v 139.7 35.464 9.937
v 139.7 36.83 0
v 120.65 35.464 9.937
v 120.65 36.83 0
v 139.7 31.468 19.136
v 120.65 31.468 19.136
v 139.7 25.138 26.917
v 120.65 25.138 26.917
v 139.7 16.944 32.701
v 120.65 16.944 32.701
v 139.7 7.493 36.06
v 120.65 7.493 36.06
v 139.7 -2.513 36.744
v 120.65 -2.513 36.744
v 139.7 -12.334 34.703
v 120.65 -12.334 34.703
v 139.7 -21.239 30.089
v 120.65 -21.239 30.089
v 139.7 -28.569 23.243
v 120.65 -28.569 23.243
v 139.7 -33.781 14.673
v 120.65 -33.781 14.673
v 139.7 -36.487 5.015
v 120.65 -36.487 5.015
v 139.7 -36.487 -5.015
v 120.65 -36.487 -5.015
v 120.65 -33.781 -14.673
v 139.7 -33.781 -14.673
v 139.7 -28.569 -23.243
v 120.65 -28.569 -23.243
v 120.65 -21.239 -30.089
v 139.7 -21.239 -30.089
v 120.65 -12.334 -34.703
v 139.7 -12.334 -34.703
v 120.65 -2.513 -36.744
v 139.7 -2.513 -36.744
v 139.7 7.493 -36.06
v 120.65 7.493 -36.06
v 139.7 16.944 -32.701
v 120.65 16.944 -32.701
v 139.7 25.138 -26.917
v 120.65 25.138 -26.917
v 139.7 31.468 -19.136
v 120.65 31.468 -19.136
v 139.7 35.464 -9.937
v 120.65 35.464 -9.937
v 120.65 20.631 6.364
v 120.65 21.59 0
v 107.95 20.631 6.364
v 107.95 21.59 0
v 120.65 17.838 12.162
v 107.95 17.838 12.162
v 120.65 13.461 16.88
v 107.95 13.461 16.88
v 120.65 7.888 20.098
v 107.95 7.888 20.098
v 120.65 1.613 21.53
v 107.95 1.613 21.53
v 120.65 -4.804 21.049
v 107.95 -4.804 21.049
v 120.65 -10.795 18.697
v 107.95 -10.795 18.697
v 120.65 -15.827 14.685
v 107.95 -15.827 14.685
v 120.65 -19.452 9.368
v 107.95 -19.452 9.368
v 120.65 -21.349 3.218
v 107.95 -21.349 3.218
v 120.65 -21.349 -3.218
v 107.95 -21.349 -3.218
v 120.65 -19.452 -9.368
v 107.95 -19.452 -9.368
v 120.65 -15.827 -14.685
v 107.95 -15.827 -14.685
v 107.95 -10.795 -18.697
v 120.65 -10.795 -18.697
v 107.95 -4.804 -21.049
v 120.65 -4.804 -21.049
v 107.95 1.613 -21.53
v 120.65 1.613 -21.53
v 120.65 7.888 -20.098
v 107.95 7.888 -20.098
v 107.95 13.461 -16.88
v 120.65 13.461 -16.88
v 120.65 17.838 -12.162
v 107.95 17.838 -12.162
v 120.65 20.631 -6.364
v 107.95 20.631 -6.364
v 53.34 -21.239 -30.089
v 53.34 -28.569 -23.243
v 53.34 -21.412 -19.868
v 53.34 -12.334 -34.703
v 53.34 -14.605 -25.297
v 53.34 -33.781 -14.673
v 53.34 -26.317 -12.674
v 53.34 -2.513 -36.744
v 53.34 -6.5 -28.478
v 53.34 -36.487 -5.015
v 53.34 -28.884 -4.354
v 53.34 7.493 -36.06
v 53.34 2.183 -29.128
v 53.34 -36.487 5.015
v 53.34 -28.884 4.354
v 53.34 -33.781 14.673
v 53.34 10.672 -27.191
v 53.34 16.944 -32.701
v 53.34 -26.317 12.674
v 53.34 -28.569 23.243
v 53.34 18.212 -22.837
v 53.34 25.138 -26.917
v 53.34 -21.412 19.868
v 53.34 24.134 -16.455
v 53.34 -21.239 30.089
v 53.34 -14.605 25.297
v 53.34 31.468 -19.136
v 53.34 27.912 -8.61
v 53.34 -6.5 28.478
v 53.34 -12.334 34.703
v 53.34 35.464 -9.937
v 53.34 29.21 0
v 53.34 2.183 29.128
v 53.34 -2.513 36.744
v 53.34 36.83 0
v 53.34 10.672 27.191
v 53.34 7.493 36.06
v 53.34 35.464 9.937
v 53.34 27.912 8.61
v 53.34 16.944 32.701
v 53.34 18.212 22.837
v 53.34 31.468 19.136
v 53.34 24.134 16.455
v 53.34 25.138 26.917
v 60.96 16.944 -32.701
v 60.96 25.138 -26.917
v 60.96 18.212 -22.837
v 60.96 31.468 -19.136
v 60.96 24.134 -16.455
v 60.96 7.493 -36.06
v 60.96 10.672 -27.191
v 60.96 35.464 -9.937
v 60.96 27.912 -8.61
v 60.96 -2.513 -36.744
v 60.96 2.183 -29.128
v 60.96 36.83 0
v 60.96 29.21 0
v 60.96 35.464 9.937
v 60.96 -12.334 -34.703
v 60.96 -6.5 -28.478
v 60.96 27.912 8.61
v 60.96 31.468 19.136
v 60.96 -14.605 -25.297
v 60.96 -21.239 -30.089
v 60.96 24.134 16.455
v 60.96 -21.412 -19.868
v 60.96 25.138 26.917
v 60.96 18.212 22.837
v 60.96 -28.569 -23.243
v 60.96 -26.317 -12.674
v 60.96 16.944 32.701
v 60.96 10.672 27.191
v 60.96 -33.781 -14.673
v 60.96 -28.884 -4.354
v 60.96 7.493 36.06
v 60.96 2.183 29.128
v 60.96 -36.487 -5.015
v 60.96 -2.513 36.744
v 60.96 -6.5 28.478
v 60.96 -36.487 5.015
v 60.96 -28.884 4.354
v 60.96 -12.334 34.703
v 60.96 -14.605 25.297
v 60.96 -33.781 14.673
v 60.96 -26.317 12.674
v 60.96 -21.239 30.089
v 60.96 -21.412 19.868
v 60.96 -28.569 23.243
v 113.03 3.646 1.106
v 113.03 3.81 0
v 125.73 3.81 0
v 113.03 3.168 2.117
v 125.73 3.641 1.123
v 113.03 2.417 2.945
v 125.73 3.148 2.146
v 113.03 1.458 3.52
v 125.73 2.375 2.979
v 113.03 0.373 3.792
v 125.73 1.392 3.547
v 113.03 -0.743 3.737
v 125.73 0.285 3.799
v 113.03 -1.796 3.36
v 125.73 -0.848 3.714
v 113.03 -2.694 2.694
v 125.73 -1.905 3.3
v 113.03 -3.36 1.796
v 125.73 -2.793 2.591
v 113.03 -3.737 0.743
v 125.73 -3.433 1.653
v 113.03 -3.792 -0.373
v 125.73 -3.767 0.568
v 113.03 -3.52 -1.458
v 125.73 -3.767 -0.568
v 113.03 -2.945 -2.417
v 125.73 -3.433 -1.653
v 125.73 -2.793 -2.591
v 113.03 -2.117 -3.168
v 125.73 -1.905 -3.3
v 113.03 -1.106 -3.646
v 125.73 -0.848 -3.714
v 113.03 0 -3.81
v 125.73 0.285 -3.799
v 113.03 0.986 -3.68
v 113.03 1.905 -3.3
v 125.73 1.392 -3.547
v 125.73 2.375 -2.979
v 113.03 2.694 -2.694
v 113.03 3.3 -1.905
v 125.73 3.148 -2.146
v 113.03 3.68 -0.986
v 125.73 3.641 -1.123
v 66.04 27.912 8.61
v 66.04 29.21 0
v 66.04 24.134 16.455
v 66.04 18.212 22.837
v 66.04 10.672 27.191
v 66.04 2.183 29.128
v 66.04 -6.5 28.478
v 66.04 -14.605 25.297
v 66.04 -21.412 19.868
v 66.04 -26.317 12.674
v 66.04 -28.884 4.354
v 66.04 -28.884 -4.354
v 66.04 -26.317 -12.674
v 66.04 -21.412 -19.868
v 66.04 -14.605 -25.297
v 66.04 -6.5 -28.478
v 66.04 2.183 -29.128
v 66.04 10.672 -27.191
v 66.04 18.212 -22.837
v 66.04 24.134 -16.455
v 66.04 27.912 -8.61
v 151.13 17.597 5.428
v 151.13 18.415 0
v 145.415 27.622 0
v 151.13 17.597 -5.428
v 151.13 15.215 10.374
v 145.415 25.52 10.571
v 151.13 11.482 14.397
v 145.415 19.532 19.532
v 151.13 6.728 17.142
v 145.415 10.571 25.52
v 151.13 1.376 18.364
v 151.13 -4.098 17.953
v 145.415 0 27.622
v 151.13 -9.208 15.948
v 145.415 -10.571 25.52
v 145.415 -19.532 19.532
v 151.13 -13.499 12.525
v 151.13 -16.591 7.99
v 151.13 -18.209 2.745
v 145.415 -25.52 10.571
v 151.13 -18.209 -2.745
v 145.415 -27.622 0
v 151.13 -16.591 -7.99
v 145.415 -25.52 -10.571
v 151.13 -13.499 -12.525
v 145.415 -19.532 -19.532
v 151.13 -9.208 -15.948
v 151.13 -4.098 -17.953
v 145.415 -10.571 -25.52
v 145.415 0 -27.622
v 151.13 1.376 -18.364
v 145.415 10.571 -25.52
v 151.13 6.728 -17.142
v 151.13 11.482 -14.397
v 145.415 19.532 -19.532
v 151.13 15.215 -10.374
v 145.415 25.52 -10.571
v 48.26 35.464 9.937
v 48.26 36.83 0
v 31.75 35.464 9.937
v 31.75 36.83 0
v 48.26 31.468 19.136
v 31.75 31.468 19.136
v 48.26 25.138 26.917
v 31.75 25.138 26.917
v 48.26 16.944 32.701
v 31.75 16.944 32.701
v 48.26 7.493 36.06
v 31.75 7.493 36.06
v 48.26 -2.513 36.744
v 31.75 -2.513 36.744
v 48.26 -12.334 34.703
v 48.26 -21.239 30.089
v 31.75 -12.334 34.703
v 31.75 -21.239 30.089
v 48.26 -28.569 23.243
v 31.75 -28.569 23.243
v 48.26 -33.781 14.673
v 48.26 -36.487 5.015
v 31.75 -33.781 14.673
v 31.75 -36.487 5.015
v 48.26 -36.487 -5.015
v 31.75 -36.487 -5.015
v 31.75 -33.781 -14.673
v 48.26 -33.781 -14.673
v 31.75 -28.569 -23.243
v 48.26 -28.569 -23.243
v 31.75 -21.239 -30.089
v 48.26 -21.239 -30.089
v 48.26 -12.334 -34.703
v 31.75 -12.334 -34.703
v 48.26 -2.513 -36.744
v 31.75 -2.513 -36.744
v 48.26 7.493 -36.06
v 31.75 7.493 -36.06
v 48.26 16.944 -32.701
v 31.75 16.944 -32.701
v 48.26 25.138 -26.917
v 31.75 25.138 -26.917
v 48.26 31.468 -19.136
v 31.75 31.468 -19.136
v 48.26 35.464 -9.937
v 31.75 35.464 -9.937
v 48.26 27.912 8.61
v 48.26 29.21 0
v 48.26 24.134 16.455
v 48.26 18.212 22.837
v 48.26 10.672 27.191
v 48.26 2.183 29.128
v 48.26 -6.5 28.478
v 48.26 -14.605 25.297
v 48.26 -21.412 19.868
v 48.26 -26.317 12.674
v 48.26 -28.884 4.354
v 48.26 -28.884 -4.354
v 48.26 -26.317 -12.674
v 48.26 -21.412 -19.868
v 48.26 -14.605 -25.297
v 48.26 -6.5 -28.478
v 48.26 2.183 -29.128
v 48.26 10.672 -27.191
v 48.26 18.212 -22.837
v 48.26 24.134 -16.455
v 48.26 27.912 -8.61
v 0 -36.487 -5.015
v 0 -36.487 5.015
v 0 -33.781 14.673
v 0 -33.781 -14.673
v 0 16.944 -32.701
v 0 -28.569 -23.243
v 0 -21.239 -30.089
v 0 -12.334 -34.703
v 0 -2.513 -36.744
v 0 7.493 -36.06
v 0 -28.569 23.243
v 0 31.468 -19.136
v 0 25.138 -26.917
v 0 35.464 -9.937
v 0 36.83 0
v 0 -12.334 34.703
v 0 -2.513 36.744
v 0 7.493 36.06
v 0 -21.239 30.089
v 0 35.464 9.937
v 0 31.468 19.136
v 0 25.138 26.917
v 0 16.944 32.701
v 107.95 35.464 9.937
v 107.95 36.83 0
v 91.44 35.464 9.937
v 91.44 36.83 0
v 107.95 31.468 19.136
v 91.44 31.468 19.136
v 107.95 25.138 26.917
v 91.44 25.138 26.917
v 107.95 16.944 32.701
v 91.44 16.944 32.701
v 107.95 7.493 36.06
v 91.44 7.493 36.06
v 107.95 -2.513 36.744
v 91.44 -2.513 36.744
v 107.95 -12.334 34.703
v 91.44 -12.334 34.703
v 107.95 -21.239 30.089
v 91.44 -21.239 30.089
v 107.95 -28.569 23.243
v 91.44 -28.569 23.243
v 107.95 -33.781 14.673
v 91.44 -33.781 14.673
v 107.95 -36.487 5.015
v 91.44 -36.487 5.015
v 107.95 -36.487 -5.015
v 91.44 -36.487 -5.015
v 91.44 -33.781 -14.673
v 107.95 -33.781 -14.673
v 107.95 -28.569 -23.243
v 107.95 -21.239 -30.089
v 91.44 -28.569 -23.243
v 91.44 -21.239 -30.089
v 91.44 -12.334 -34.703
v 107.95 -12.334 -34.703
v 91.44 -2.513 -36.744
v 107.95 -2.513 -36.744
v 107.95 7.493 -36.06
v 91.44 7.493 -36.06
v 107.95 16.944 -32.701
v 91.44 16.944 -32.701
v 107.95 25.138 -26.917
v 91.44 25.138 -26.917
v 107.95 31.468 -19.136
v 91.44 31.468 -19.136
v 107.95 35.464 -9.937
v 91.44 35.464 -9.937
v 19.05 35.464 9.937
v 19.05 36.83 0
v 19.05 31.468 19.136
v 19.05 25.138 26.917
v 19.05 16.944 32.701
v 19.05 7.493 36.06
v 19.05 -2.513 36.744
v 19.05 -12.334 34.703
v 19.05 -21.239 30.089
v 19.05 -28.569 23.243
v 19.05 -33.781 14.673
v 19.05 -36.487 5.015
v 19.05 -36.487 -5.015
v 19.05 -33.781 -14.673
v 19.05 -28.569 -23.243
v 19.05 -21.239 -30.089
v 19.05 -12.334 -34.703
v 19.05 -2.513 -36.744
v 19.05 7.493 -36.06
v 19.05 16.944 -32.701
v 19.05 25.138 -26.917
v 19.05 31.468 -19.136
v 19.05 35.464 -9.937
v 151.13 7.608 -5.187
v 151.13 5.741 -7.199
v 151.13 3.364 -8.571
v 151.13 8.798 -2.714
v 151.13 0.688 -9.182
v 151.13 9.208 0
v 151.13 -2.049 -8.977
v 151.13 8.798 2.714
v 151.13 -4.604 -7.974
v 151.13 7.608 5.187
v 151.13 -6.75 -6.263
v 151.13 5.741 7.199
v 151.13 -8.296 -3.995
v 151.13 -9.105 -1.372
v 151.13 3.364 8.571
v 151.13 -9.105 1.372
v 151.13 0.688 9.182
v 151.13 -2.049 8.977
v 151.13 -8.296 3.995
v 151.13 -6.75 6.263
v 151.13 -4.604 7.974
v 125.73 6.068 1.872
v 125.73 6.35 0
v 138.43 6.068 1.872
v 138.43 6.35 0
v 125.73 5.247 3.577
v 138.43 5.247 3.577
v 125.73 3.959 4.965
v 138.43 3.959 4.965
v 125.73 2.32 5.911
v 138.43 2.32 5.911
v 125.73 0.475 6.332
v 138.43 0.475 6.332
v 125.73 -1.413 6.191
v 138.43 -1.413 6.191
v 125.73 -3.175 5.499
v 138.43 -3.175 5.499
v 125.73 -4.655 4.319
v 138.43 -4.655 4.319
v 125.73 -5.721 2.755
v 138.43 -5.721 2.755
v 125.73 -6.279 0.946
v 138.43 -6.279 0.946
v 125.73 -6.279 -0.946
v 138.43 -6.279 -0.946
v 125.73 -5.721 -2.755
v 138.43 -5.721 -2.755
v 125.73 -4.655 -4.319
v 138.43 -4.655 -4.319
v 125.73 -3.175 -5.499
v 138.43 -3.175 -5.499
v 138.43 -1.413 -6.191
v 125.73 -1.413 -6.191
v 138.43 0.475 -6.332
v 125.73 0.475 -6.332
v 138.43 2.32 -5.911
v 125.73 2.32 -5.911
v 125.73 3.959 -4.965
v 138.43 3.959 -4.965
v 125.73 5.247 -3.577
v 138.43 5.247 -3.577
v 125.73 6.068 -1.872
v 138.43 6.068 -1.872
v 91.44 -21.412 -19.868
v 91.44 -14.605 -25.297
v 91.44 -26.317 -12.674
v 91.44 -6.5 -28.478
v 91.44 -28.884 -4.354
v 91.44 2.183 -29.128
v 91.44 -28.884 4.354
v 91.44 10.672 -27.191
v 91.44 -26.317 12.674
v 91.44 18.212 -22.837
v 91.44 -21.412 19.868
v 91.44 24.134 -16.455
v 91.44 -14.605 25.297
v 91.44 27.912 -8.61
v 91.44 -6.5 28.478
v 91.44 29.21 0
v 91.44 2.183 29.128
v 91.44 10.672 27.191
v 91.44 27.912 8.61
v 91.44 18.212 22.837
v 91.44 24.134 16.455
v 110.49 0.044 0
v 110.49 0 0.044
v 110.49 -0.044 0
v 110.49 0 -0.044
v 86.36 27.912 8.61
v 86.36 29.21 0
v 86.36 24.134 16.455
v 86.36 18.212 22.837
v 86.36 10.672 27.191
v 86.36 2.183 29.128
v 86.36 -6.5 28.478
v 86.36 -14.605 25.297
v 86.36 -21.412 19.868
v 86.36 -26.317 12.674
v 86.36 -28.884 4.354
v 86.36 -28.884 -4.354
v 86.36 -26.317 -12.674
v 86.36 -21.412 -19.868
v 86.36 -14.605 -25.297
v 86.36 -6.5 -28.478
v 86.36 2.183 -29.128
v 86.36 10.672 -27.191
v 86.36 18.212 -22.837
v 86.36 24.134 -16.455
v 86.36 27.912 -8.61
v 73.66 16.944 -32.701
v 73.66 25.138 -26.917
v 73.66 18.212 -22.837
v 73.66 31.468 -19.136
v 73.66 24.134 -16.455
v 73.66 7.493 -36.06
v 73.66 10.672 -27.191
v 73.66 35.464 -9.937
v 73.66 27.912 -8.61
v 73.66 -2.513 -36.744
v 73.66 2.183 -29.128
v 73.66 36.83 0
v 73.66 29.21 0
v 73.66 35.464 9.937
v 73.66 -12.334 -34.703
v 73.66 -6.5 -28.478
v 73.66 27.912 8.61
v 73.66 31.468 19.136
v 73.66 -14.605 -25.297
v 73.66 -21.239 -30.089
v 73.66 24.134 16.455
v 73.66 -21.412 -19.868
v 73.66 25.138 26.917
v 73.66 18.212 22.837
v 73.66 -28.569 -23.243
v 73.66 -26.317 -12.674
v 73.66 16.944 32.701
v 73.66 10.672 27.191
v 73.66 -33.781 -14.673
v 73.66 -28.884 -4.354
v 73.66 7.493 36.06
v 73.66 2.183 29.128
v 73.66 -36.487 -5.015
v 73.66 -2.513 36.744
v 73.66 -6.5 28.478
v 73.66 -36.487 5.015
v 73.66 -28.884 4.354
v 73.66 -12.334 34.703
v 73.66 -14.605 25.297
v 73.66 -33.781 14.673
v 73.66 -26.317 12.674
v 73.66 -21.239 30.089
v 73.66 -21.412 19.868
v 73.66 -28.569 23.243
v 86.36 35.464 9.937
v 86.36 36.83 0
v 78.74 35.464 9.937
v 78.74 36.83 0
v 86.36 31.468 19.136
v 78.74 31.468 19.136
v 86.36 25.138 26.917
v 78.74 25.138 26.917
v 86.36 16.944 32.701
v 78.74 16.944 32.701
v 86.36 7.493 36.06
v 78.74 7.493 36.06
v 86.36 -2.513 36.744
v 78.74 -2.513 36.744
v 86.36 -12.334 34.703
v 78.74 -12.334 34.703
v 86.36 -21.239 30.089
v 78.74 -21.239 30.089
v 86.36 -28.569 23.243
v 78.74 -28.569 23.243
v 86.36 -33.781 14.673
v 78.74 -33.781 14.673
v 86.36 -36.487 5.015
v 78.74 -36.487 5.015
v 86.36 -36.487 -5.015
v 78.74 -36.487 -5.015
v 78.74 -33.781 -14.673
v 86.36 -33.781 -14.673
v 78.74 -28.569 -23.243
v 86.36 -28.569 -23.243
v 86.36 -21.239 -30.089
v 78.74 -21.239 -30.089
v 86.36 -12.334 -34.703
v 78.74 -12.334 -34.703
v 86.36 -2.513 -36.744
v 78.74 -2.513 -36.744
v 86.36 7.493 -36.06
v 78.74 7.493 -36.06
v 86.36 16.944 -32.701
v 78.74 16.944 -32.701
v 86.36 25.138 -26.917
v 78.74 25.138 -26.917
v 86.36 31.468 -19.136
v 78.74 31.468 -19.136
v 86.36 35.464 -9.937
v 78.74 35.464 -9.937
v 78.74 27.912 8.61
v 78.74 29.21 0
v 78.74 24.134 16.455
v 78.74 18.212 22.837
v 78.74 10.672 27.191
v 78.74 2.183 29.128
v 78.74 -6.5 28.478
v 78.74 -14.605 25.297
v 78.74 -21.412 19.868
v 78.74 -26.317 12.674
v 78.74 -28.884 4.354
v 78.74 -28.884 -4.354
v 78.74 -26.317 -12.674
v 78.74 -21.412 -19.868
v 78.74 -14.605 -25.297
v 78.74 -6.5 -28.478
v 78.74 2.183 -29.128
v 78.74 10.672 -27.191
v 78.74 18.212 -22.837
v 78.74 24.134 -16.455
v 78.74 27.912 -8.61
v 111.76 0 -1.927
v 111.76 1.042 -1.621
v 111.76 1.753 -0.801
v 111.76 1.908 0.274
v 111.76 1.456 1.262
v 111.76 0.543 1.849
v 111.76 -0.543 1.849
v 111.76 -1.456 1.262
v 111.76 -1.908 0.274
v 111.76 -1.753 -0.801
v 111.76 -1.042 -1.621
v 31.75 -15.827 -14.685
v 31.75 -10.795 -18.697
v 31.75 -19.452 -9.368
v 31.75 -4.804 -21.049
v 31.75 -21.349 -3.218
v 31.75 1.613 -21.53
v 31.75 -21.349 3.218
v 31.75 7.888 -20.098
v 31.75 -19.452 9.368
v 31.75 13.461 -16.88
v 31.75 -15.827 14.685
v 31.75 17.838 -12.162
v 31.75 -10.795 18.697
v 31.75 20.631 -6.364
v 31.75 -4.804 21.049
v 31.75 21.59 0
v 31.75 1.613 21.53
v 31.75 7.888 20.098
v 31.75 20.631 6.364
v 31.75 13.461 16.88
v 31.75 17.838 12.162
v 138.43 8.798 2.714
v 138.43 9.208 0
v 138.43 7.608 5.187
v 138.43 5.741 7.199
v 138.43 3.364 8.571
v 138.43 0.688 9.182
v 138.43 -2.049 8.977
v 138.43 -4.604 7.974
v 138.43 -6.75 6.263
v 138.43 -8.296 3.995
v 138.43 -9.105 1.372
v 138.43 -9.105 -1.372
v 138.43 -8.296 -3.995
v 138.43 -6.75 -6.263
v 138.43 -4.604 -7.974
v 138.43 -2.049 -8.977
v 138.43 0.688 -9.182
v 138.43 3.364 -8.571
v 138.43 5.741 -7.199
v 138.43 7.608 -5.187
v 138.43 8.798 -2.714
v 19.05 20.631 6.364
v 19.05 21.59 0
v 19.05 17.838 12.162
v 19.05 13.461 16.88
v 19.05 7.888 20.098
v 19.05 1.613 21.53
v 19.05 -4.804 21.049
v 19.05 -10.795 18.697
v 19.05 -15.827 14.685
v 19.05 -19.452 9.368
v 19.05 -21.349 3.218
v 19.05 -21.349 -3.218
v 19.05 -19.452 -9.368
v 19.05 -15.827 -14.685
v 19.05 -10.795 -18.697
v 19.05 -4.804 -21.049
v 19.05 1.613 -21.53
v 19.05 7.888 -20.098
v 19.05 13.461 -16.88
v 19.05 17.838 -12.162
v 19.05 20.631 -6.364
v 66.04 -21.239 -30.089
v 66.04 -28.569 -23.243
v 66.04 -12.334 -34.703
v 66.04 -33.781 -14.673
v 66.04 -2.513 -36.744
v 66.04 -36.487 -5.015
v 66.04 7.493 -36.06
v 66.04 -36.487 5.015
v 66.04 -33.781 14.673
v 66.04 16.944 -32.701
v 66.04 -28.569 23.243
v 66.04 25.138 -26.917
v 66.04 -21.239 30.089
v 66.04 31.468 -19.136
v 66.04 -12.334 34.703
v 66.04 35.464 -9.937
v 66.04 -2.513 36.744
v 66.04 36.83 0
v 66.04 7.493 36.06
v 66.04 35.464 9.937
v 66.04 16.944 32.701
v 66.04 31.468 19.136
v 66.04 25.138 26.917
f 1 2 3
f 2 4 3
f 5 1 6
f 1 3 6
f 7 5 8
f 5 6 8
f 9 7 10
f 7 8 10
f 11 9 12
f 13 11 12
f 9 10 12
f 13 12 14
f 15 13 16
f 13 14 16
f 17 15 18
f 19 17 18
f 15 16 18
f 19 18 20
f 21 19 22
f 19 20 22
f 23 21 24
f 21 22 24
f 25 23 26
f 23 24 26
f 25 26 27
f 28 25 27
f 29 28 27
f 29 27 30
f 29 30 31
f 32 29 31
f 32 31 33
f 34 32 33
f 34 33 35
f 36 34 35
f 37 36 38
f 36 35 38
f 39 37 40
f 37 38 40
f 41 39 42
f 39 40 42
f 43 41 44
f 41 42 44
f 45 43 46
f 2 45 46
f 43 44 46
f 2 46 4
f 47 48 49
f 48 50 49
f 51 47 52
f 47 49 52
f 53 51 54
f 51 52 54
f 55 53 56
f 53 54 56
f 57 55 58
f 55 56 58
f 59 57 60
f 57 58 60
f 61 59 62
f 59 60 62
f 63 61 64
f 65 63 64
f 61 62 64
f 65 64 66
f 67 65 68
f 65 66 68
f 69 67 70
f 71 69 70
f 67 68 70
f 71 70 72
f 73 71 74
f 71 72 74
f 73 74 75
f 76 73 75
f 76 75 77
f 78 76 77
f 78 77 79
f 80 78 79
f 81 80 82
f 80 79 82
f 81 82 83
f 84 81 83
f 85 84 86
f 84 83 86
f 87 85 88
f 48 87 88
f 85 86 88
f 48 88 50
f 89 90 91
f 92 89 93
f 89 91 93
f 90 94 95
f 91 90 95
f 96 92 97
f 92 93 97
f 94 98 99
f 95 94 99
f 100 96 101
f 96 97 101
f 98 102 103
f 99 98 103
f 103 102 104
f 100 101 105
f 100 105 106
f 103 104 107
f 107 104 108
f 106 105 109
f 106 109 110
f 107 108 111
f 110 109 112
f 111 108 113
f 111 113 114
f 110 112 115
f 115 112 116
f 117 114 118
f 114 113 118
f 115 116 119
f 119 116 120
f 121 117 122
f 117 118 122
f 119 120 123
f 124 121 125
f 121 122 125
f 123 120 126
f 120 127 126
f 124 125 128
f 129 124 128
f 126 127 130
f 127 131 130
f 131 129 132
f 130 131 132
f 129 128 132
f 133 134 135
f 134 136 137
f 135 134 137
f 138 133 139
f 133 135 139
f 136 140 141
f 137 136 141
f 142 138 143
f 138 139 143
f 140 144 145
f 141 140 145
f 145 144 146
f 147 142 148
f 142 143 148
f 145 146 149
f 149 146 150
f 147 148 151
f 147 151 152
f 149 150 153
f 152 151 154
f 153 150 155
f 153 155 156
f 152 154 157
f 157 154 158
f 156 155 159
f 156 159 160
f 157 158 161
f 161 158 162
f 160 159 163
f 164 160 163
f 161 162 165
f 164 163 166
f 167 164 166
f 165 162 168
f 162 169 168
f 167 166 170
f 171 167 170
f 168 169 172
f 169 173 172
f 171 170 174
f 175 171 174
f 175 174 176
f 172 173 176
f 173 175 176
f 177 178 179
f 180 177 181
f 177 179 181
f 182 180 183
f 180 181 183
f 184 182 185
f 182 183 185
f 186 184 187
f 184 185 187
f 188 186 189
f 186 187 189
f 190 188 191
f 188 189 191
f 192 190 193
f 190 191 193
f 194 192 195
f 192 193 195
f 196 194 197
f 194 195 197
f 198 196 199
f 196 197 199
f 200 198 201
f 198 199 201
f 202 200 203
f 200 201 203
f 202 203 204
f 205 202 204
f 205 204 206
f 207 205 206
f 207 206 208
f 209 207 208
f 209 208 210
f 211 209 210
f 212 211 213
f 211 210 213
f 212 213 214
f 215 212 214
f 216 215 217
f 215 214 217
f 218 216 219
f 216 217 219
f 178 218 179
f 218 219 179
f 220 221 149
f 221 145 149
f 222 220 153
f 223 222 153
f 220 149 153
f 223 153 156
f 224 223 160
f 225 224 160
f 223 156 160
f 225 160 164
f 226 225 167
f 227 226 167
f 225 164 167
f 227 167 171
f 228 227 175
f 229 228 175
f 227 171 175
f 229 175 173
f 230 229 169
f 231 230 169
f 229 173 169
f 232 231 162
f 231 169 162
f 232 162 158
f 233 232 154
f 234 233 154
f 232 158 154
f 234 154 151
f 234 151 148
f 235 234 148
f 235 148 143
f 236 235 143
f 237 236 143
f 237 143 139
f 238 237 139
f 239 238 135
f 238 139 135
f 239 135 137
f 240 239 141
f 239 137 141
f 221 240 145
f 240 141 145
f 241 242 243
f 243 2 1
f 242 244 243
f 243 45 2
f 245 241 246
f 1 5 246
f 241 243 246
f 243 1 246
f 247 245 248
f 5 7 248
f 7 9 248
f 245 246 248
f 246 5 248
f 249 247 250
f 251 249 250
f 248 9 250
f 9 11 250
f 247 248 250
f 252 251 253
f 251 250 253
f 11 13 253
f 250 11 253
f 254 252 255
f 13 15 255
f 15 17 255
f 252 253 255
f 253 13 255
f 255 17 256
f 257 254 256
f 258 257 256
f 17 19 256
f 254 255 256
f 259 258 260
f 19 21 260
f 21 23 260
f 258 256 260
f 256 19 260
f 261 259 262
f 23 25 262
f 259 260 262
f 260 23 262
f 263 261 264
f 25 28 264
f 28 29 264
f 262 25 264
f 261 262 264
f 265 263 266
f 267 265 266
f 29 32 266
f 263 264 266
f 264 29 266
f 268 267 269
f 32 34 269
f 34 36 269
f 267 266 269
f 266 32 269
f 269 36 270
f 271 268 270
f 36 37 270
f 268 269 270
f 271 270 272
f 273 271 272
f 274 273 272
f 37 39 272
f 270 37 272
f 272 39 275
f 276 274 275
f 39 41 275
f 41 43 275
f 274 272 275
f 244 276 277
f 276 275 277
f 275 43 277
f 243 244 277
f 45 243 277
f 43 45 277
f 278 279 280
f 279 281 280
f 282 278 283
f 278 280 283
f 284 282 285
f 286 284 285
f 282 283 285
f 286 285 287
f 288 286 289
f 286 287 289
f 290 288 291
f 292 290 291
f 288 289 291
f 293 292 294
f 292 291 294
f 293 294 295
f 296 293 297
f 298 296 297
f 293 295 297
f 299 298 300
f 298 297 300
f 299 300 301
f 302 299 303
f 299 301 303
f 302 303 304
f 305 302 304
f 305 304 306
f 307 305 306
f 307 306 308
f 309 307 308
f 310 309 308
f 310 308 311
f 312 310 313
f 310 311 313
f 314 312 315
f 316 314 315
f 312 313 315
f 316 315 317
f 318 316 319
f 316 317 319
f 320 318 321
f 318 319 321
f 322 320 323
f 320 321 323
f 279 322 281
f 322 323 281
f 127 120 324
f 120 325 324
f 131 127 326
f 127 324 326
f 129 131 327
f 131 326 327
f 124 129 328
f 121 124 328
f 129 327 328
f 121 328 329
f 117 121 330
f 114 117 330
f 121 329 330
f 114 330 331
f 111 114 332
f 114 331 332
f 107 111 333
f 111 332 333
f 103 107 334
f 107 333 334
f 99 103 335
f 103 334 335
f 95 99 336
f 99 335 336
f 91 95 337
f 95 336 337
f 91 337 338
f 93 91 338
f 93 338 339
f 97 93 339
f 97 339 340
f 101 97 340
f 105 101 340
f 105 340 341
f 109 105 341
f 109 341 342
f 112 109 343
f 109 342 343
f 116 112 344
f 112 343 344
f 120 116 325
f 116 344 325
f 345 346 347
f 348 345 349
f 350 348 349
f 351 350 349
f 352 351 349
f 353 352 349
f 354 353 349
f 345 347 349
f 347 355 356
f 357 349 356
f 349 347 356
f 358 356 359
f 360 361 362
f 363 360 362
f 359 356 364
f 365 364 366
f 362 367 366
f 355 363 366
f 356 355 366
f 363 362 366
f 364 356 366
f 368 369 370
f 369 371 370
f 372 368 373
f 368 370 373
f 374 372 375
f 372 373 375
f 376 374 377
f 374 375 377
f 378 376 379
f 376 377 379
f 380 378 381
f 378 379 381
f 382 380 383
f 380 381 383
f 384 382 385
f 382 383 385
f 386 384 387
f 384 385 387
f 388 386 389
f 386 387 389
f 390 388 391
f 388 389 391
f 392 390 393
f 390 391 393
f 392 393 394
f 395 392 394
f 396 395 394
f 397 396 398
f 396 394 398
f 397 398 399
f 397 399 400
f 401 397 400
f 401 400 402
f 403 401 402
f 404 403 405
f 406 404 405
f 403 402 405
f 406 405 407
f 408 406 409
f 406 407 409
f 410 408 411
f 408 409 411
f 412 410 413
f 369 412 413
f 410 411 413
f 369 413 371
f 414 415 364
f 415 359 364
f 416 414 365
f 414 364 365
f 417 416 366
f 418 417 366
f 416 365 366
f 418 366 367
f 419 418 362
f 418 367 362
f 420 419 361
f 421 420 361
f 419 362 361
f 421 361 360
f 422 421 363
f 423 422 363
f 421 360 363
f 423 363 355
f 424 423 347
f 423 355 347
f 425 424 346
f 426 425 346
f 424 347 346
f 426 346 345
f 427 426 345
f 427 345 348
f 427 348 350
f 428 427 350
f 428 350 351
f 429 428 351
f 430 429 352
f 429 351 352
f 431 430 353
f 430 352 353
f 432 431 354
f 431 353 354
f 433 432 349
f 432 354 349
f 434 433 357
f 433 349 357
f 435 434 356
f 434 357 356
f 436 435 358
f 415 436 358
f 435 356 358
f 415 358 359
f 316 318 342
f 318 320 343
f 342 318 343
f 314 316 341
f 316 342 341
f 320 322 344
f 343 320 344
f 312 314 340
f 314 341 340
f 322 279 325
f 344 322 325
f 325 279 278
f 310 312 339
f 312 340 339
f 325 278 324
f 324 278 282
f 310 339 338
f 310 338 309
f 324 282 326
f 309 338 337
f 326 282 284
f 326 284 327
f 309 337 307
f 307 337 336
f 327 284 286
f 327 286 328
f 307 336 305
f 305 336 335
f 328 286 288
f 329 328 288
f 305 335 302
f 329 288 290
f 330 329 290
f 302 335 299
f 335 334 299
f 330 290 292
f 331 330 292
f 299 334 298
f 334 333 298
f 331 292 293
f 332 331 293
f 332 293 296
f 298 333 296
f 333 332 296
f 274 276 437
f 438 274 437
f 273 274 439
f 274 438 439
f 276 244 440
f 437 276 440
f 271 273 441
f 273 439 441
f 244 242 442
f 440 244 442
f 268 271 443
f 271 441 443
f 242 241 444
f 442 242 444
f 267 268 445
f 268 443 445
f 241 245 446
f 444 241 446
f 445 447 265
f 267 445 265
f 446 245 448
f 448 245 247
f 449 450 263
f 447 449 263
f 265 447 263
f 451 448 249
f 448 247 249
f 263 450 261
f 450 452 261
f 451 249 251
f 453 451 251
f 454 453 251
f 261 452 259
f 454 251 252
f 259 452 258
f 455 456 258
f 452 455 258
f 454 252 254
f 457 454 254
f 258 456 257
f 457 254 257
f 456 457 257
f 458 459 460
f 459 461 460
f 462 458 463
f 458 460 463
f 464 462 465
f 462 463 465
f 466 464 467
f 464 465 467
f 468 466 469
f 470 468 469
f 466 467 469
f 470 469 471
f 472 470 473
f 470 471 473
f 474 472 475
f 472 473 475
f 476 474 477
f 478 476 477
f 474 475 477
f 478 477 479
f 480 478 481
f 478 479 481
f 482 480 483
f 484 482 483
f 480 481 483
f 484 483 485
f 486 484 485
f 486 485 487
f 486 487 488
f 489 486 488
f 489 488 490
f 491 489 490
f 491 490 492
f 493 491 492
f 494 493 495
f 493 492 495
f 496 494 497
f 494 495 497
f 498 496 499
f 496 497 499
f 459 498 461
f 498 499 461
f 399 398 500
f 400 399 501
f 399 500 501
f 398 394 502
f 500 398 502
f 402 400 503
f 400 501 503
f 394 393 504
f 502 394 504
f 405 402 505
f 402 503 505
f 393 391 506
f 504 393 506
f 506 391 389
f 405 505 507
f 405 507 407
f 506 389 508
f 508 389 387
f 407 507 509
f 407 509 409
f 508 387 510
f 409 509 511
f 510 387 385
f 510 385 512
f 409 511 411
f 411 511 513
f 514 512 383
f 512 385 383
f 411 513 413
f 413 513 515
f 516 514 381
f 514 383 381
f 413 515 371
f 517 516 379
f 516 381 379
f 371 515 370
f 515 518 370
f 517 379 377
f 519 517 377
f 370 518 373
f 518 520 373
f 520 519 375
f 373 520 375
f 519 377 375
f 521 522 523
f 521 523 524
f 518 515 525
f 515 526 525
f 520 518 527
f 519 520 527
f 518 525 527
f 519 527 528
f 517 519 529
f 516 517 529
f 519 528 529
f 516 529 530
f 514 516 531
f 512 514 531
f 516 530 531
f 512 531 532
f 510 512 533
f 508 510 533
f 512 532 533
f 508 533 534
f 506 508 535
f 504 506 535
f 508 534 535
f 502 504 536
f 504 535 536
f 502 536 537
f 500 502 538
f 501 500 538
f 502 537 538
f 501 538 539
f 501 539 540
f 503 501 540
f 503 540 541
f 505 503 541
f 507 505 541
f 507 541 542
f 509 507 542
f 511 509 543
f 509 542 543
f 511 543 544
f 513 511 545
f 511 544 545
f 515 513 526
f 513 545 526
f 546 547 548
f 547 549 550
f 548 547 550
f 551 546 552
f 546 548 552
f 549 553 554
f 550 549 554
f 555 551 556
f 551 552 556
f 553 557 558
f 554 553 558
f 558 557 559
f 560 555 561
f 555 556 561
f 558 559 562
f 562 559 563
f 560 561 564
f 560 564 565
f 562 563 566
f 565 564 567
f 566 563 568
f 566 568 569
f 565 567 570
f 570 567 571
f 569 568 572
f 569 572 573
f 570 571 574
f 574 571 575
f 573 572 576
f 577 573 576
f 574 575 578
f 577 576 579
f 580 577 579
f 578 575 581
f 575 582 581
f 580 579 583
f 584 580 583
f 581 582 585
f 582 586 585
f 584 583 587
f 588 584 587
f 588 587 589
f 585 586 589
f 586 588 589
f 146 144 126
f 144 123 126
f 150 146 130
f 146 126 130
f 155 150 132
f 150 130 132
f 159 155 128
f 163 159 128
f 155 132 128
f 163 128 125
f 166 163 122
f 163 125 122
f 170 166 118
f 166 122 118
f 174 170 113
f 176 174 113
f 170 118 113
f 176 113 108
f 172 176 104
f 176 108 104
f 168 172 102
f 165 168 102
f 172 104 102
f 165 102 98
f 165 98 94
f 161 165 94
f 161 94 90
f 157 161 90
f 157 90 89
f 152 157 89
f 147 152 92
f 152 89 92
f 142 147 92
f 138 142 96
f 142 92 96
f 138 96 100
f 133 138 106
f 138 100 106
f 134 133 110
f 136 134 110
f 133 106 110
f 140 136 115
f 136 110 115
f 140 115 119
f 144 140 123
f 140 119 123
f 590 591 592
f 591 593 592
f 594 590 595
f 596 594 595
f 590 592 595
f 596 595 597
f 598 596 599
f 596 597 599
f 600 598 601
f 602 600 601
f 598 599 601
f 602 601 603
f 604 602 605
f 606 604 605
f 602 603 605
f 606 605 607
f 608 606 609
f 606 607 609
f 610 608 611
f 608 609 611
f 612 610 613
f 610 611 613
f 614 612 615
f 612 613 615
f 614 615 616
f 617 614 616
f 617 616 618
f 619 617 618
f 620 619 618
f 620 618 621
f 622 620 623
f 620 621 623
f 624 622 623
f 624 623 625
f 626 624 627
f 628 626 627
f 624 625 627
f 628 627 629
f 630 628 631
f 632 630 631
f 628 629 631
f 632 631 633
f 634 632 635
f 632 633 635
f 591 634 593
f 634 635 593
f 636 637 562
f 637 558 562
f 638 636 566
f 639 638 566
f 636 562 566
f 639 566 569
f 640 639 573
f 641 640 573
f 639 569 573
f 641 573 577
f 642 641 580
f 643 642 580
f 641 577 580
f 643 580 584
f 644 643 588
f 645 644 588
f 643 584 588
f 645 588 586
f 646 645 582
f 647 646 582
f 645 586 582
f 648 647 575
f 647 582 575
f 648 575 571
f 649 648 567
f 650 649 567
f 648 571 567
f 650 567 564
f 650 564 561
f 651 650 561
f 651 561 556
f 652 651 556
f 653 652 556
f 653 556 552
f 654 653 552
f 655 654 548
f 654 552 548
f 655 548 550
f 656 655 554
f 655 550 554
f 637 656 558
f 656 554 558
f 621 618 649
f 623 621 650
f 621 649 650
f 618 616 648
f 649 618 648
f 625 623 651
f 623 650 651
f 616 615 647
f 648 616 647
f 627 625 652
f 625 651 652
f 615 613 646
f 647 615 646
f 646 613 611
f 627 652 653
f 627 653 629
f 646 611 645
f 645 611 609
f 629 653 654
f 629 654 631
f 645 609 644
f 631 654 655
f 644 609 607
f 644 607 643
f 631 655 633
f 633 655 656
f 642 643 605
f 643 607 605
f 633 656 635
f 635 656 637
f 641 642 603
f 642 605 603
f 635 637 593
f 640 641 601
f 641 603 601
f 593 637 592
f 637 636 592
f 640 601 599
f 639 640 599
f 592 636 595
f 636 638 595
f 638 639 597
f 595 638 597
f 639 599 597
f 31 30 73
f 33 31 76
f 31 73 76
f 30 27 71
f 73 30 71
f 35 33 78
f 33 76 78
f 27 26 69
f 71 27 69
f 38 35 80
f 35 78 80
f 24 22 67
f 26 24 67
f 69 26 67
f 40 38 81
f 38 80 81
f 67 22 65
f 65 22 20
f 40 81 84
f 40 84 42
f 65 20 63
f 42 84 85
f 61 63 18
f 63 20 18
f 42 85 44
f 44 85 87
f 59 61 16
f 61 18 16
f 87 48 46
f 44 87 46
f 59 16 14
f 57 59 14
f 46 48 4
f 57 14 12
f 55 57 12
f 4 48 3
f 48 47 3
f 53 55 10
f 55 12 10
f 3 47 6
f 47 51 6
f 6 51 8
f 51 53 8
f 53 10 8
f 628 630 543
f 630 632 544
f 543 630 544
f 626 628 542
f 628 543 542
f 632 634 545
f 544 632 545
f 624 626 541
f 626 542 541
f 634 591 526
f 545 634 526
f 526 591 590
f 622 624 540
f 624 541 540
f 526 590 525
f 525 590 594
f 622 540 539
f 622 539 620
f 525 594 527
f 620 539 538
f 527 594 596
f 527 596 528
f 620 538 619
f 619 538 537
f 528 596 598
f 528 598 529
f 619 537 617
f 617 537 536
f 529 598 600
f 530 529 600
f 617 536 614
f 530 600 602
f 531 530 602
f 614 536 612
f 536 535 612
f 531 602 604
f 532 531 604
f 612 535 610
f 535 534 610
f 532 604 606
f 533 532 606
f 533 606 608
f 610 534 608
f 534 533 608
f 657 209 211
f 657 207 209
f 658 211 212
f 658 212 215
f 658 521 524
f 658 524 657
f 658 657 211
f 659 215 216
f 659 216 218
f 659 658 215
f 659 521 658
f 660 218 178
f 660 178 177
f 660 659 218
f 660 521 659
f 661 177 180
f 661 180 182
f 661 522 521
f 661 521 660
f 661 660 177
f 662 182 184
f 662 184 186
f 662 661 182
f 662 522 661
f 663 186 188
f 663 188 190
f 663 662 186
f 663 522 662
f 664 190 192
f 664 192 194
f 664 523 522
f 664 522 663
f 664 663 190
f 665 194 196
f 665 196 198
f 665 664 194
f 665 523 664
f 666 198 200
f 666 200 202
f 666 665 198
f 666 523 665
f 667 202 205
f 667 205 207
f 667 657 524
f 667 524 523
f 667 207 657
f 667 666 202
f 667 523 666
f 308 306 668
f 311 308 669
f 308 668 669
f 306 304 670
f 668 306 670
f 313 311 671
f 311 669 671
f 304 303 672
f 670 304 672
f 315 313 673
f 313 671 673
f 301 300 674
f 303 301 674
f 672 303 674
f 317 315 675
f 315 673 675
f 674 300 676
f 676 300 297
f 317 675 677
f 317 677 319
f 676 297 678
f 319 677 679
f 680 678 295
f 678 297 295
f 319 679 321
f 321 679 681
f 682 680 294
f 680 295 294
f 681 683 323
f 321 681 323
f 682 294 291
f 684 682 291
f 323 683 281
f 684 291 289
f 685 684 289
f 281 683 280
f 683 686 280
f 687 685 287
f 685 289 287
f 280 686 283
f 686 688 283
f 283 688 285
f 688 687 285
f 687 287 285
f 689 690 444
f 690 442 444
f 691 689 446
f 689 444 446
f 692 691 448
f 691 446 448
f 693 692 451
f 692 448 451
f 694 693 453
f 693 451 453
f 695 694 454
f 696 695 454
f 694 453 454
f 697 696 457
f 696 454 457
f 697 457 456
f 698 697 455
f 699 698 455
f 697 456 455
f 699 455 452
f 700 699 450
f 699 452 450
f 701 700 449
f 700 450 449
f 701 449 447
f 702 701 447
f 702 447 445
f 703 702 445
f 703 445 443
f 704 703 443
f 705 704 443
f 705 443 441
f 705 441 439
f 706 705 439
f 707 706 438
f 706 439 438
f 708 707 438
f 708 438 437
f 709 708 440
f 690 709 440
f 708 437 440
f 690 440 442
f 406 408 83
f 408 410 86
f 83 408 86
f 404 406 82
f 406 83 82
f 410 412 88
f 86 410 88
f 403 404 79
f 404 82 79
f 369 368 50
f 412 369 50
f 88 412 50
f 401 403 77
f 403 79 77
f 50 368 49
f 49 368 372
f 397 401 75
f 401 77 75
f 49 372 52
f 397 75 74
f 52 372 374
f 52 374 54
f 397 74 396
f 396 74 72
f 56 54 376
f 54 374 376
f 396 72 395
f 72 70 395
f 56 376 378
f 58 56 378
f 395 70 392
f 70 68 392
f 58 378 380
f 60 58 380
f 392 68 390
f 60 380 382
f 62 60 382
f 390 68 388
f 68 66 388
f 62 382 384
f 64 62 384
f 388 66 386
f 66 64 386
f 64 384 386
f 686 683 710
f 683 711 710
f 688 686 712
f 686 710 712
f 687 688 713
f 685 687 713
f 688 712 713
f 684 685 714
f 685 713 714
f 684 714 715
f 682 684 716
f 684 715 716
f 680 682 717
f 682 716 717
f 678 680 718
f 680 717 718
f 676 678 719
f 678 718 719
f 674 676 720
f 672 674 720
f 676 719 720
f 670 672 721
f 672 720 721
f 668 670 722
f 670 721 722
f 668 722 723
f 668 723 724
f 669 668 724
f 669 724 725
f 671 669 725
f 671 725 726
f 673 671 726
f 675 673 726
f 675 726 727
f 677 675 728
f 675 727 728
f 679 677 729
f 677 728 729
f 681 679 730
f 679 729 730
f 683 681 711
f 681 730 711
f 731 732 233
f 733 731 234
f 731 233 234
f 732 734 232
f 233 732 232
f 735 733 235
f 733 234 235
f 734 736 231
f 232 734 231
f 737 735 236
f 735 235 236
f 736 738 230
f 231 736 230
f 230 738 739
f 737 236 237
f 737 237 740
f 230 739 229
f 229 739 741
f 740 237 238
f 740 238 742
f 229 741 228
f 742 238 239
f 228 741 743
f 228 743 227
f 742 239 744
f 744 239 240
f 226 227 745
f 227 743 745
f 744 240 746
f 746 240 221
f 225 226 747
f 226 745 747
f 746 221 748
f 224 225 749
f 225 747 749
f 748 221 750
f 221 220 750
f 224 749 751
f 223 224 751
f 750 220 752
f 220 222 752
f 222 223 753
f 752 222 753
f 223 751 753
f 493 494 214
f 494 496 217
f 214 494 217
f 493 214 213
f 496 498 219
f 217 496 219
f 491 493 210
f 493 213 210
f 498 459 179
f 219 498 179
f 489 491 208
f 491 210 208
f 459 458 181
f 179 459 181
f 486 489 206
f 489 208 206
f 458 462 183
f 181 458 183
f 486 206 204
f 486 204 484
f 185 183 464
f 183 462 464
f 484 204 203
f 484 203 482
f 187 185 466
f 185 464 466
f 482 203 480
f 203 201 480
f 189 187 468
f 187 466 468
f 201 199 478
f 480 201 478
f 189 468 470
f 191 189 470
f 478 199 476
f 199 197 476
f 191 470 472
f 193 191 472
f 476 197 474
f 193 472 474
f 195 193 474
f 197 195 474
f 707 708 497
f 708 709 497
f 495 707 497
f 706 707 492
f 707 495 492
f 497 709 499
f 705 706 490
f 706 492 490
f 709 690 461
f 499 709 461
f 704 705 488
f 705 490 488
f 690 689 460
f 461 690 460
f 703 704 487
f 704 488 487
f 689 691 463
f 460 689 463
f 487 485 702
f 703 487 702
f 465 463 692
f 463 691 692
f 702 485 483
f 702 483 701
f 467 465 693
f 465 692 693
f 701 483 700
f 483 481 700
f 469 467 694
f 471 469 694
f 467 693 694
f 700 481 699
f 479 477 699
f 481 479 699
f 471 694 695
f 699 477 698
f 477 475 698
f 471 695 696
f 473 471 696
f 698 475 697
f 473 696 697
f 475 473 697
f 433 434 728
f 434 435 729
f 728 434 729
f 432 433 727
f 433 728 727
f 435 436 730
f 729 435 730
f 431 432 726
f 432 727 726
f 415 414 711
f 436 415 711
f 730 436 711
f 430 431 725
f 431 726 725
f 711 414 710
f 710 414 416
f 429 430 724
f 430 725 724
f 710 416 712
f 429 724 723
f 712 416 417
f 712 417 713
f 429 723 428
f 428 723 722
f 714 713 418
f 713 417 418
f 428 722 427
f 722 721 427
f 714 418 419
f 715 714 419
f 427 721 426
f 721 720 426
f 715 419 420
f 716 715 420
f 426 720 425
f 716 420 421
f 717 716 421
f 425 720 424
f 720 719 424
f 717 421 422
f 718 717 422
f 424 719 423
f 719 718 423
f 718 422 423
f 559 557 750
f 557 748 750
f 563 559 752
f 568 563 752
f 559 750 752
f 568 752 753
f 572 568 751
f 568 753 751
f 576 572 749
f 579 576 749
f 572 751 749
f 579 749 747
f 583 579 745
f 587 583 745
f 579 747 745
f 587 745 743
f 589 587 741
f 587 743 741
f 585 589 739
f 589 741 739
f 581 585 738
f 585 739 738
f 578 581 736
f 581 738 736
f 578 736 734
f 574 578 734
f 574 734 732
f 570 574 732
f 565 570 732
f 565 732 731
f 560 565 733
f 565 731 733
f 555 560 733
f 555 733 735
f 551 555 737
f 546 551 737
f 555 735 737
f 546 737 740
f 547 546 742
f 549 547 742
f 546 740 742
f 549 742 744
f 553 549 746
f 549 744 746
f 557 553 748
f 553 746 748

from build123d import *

# Parameters (mm, degrees)
SKETCH3_R          = 3.81
CUT_EXTRUDE1_DEPTH = 2.54
CUT_EXTRUDE1_TAPER = 56


with BuildPart() as part:
    # Sketch1 → Revolve5 (revolve)
    with BuildSketch(Plane.XY):
        Polygon((0, 0), (113.03, 0), (113.03, 3.81), (125.73, 3.81), (125.73, 6.35), (138.43, 6.35), (138.43, 9.2075), (151.13, 9.2075), (151.13, 18.415), (139.700007257, 36.83), (120.650007257, 36.83), (120.650007257, 21.59), (107.950007257, 21.59), (107.950007257, 36.83), (91.440007257, 36.83), (91.440007257, 29.21), (86.360007257, 29.21), (86.360007257, 36.83), (78.740007257, 36.83), (78.740007257, 29.21), (73.660007257, 29.21), (73.660007257, 36.83), (66.040007257, 36.83), (66.040007257, 29.21), (60.960007257, 29.21), (60.960007257, 36.83), (53.340007257, 36.83), (53.340007257, 29.21), (48.260007257, 29.21), (48.260007257, 36.83), (31.750007257, 36.83), (31.750007257, 21.59), (19.050007257, 21.59), (19.050007257, 36.83), (0, 36.83), align=None)
    revolve(axis=Axis((0, 0, 0), (1, 0, 0)))

    # Sketch3 → Cut-Extrude1 (cut)
    with BuildSketch(Plane(origin=(113.03, 0, 0), x_dir=(0, 0, -1), z_dir=(1, 0, 0))):
        Circle(SKETCH3_R)
    extrude(amount=-CUT_EXTRUDE1_DEPTH, taper=CUT_EXTRUDE1_TAPER, mode=Mode.SUBTRACT)


solid = part.part
